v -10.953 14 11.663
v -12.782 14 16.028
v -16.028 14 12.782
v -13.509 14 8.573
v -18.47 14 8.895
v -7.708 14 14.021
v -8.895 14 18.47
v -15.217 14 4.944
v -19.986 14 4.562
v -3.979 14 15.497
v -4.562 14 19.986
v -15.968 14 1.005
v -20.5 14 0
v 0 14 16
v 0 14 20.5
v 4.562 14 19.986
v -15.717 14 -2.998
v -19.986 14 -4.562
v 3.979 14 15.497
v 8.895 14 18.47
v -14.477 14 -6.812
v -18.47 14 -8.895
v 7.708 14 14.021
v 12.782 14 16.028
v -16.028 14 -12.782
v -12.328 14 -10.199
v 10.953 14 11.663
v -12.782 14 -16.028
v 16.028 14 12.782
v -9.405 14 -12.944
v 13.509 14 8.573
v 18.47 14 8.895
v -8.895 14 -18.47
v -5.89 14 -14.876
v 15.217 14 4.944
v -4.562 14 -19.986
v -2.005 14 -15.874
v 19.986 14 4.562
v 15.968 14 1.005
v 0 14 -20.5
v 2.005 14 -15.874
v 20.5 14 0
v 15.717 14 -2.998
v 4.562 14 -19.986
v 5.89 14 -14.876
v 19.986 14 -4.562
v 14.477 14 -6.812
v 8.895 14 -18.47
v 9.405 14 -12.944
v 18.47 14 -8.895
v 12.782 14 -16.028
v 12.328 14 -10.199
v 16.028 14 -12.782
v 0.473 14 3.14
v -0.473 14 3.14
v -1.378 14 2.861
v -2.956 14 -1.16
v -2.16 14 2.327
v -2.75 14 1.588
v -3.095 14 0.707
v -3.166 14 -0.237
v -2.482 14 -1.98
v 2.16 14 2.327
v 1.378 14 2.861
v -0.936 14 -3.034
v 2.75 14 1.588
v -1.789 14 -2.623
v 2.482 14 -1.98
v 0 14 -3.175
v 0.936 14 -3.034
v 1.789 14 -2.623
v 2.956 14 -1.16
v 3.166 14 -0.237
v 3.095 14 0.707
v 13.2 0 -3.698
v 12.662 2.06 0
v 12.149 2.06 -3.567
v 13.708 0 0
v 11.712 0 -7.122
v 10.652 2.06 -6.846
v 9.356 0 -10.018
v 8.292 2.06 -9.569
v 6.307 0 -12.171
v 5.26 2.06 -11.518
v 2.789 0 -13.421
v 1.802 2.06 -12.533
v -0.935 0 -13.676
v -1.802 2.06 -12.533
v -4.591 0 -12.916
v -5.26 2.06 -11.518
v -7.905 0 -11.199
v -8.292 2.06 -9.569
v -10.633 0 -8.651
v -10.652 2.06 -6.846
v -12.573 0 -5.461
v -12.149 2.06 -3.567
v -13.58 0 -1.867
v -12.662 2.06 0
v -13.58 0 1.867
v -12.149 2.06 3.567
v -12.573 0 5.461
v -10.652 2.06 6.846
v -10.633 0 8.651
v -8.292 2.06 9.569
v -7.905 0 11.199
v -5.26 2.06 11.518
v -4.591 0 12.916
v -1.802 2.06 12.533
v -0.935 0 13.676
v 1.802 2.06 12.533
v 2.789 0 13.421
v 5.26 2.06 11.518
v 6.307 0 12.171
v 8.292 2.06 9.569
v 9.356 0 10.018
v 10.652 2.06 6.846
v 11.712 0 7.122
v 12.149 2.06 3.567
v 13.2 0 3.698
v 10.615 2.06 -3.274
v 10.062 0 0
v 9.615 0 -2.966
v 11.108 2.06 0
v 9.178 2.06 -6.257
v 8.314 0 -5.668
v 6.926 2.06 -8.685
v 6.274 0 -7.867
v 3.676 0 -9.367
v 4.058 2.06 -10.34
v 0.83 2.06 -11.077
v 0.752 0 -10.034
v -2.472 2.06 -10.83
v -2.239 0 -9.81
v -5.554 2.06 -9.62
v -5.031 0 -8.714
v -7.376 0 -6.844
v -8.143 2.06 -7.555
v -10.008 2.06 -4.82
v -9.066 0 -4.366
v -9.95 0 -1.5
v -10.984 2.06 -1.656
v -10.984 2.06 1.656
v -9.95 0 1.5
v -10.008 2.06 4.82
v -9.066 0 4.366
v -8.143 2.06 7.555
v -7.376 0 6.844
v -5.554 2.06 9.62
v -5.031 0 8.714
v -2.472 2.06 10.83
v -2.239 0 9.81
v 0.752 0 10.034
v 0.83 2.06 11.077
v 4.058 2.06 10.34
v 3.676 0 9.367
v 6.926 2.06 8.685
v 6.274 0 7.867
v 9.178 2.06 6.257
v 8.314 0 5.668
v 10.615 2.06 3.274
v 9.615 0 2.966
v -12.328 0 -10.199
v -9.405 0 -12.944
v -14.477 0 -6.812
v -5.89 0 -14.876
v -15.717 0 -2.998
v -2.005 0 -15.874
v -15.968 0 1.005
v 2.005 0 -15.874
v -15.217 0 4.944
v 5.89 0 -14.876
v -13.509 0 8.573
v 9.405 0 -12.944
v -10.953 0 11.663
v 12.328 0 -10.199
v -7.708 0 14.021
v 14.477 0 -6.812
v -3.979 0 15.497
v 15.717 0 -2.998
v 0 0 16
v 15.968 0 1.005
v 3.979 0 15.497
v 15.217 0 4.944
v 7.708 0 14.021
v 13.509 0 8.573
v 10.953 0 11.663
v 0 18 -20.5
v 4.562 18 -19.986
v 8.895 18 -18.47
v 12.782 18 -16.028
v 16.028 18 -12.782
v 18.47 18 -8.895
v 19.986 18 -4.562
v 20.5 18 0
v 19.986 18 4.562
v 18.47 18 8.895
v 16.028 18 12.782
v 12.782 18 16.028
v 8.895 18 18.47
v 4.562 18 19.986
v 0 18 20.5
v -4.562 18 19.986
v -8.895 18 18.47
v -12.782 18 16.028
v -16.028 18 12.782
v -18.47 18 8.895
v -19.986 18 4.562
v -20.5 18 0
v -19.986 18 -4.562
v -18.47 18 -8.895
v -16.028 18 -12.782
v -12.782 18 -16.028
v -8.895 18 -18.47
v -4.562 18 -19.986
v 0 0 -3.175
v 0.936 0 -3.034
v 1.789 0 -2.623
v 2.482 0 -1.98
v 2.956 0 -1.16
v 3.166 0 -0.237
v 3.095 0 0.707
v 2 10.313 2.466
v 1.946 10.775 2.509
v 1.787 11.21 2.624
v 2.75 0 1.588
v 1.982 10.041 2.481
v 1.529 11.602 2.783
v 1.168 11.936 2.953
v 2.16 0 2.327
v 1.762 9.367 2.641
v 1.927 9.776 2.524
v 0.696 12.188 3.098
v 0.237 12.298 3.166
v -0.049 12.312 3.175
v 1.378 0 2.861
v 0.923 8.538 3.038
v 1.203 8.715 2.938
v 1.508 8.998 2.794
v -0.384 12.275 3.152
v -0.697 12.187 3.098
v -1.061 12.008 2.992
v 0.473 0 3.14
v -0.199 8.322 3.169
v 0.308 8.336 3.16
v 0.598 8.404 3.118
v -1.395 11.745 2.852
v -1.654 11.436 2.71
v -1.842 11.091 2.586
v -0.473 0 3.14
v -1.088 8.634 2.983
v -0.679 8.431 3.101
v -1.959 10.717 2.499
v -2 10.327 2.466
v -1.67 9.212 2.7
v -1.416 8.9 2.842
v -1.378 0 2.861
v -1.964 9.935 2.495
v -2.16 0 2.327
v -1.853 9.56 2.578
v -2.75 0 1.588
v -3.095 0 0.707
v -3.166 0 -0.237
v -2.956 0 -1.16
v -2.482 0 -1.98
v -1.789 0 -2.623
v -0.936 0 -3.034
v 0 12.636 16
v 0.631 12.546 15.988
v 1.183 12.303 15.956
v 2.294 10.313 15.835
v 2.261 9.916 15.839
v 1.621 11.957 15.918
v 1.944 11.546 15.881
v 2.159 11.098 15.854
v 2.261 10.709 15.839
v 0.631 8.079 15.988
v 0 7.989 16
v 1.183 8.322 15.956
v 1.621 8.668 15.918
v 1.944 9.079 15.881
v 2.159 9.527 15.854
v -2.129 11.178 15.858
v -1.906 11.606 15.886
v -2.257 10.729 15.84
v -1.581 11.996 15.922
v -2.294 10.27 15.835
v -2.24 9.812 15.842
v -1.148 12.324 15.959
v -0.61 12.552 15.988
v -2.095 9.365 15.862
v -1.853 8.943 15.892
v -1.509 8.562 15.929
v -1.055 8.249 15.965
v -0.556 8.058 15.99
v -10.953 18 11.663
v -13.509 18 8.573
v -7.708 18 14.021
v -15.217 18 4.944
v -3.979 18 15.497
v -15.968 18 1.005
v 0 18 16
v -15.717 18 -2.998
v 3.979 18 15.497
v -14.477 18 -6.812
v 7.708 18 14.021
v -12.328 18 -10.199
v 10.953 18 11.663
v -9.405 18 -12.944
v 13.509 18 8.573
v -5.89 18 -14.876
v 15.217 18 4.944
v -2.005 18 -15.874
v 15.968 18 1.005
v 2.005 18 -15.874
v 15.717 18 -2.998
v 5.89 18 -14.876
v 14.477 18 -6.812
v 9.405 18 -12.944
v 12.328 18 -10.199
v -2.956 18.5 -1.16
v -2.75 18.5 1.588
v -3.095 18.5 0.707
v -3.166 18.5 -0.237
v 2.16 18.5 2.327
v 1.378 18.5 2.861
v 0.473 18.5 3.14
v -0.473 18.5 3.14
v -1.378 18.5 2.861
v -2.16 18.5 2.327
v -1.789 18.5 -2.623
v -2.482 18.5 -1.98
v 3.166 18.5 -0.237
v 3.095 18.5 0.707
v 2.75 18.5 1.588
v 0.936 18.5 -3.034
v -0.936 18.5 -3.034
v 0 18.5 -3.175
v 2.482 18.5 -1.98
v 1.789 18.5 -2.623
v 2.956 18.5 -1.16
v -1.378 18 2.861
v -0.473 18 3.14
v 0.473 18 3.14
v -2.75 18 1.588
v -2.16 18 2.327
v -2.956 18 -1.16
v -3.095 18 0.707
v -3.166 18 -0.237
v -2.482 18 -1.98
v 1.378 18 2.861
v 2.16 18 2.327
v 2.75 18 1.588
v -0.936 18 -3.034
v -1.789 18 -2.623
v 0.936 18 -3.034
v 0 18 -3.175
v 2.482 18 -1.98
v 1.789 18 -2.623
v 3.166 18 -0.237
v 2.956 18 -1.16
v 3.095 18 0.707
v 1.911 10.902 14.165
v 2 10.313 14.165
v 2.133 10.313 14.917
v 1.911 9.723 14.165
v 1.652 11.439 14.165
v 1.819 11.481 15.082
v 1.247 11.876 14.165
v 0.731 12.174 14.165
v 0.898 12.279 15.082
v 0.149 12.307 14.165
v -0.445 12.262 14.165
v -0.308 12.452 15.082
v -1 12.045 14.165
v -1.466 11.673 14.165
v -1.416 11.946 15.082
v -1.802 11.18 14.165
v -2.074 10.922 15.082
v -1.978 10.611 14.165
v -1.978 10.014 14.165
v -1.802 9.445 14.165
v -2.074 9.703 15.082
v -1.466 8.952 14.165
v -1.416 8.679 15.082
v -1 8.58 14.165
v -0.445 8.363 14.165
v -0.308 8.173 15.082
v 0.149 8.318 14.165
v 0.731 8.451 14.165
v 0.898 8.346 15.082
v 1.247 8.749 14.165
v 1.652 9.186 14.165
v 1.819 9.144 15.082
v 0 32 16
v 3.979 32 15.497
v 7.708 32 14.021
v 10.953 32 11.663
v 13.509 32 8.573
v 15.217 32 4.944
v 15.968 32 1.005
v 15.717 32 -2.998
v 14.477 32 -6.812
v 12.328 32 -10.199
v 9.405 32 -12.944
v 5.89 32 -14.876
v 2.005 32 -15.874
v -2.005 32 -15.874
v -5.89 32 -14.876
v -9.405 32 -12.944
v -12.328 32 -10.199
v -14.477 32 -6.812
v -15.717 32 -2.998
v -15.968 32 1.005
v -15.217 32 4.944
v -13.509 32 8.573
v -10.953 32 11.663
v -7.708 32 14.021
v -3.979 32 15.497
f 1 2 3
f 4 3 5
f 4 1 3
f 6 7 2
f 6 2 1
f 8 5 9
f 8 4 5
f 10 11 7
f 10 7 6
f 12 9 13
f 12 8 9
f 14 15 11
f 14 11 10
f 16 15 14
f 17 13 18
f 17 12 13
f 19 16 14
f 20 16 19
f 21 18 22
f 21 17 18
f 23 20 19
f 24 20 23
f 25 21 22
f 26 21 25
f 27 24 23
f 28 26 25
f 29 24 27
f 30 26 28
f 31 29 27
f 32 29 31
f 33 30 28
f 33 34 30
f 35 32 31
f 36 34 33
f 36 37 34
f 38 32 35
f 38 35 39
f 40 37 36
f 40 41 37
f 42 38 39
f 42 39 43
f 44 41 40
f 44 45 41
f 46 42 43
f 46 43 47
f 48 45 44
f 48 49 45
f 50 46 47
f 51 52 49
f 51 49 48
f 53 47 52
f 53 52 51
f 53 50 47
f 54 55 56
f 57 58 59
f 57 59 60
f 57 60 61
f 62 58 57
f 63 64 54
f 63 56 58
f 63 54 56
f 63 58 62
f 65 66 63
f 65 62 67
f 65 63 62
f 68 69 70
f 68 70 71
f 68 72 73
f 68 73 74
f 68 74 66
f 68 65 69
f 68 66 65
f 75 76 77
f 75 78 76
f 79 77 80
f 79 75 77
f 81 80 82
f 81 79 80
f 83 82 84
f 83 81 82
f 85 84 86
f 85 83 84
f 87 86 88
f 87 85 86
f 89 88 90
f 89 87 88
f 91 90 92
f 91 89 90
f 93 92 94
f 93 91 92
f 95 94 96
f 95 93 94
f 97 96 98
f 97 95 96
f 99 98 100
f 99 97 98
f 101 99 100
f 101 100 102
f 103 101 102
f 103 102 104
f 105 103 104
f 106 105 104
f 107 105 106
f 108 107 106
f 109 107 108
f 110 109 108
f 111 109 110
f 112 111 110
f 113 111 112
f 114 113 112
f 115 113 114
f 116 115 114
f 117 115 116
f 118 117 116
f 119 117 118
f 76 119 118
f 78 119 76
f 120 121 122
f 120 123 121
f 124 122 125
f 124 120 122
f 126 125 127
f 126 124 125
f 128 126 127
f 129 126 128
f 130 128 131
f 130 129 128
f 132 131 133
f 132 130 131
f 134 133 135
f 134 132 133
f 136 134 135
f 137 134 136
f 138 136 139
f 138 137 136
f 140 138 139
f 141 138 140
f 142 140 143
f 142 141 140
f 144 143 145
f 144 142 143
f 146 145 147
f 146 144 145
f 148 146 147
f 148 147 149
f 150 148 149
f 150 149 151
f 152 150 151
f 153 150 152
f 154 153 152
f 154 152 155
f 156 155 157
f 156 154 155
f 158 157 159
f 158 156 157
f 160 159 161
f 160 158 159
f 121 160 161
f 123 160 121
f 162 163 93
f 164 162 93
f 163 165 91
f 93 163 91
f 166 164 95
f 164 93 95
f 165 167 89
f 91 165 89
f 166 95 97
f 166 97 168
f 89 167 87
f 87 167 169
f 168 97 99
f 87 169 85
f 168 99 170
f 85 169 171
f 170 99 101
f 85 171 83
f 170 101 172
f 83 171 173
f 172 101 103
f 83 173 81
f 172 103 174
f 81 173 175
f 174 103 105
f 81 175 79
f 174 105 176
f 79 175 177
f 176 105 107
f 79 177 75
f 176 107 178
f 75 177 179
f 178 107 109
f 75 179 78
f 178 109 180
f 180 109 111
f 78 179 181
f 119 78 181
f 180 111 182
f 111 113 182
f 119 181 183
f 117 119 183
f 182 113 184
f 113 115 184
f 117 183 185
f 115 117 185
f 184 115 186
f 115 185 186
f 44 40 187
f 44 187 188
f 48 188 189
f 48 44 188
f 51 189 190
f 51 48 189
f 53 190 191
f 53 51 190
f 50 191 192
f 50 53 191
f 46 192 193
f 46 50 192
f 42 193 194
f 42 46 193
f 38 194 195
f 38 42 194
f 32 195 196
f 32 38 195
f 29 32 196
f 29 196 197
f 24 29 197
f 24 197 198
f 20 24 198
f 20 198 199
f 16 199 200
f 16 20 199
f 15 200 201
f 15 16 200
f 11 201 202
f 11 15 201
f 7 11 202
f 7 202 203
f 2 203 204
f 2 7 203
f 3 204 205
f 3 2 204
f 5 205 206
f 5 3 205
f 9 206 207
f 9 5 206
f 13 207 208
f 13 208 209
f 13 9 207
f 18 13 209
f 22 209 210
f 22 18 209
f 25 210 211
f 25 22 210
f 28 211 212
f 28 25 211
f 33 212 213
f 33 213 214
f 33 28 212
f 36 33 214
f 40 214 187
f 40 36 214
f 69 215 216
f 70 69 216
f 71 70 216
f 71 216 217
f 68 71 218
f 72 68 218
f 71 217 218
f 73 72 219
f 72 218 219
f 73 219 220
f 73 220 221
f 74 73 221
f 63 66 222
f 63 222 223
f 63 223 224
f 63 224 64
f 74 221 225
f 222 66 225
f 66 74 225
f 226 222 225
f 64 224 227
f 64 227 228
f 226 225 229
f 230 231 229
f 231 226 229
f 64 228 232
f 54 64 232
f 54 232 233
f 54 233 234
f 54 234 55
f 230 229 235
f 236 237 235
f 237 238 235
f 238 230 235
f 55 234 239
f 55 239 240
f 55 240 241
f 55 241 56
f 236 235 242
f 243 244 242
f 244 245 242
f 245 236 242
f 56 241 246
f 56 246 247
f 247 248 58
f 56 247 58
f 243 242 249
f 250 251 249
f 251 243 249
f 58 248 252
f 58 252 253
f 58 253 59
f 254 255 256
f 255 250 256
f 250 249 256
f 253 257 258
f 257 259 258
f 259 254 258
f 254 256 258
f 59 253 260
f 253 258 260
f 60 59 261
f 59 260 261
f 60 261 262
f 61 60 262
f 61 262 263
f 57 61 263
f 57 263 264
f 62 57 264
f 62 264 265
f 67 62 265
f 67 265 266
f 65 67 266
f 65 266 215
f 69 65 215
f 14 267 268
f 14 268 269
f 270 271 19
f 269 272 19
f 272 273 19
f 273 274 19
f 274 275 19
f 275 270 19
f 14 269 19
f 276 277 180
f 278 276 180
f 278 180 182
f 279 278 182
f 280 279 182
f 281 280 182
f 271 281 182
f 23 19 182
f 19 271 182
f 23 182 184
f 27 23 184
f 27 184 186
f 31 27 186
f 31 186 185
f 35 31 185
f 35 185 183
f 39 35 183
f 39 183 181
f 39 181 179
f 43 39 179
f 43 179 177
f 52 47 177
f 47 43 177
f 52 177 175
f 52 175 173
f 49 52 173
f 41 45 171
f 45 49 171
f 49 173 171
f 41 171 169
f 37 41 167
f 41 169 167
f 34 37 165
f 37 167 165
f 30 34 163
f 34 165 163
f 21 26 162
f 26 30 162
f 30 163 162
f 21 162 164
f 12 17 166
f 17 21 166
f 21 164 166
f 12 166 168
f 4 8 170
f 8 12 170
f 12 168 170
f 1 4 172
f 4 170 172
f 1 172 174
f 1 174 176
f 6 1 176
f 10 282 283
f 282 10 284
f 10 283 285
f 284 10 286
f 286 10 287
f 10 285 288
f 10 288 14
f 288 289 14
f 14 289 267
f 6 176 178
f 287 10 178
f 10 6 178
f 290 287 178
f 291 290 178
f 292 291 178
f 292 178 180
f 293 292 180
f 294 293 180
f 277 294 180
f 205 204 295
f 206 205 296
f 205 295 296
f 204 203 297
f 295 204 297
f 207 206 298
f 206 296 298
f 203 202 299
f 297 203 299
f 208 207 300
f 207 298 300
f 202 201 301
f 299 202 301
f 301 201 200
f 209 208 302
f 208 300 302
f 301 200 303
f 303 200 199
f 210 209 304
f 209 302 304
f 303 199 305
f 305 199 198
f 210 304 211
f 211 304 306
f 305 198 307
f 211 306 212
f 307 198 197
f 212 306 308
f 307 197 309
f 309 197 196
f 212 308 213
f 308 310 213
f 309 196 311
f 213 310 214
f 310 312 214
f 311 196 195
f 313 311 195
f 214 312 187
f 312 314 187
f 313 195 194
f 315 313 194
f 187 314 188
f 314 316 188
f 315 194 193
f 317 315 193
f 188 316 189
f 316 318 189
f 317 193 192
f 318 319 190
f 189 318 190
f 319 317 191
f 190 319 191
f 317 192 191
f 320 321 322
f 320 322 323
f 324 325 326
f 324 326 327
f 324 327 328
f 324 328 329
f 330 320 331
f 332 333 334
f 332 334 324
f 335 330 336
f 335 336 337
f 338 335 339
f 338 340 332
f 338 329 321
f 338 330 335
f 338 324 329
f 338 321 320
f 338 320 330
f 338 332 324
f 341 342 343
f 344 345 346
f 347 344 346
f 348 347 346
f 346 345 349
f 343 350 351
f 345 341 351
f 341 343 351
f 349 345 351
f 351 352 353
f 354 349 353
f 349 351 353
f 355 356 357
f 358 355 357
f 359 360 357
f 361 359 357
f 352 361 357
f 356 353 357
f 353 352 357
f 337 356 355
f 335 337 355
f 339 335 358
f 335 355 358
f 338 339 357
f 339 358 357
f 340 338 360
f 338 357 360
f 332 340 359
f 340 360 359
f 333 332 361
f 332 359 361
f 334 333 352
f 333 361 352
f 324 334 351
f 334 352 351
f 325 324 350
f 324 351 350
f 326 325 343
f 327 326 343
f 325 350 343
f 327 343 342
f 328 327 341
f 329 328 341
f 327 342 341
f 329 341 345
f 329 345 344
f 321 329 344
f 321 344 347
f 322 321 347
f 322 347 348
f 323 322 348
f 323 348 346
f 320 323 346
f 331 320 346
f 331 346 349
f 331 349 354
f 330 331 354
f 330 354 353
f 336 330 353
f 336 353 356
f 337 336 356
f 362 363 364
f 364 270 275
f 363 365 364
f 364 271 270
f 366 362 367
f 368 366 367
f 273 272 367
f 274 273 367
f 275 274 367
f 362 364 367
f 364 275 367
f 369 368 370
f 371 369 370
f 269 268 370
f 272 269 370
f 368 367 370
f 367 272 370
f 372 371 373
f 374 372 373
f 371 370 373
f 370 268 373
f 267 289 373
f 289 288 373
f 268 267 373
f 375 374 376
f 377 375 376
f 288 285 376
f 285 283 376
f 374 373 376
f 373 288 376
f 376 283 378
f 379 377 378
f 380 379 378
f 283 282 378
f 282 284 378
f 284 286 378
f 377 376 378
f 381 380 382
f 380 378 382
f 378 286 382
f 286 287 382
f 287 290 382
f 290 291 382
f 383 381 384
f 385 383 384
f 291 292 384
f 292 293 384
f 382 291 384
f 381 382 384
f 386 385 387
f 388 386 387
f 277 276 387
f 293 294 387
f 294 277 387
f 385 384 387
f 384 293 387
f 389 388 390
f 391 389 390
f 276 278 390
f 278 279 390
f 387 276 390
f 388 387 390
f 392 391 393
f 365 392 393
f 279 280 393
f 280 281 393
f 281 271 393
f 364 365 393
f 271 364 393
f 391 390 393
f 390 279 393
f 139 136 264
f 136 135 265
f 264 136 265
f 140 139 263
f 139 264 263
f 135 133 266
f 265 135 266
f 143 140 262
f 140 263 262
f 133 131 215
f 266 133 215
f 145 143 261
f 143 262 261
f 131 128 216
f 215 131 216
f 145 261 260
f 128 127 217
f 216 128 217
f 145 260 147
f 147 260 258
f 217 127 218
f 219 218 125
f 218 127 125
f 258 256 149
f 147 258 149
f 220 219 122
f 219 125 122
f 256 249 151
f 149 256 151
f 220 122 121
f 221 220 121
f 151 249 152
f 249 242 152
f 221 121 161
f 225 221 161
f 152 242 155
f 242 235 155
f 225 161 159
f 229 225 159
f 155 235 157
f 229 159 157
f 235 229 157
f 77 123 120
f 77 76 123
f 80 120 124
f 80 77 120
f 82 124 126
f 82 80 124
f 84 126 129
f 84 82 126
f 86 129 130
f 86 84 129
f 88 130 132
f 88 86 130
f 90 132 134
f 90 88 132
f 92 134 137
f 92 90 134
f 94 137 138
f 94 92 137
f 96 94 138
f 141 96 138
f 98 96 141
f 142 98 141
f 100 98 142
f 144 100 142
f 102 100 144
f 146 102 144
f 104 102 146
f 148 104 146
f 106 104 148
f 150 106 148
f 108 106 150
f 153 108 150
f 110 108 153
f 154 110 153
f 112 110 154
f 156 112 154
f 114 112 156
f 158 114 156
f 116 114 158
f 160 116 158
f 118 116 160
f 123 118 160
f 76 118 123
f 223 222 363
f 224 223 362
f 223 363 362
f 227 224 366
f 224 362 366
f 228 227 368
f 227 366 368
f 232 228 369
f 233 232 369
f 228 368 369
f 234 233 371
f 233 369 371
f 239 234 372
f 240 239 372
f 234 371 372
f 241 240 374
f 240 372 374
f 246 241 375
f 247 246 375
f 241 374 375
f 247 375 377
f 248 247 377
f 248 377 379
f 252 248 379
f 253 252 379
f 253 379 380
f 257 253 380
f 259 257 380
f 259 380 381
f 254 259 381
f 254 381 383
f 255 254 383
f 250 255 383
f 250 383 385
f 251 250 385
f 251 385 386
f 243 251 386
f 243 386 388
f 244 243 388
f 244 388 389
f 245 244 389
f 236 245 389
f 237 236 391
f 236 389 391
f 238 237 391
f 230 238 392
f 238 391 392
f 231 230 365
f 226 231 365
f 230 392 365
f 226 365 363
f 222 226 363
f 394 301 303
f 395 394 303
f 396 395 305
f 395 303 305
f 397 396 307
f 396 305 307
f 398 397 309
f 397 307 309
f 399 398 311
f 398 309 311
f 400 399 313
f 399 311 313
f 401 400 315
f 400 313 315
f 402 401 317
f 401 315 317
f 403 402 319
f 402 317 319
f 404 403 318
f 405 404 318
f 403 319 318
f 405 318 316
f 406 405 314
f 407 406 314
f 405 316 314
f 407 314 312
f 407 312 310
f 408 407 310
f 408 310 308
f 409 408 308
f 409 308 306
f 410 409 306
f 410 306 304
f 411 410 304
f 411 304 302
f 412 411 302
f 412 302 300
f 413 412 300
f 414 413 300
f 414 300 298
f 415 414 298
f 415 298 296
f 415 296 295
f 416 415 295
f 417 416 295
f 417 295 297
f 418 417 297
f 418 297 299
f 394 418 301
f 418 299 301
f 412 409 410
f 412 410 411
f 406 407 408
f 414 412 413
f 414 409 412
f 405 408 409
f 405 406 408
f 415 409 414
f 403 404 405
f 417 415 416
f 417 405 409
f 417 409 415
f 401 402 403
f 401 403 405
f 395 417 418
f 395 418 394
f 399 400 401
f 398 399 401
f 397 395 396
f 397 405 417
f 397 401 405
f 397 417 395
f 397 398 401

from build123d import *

# Parameters (mm, degrees)
SKETCH1_R          = 16
EXTRUDE1_DEPTH     = 32
SKETCH2_R          = 3.175
EXTRUDE2_DEPTH     = 18.5
SKETCH5_R          = 20.5
EXTRUDE3_DEPTH     = 4
CUT_EXTRUDE1_START = 20
SKETCH6_R          = 2
CUT_EXTRUDE1_DEPTH = 20
CUT_EXTRUDE3_START = 19
SKETCH7_R          = 2.852570135
CUT_EXTRUDE3_DEPTH = 5
CUT_EXTRUDE3_DRAFT = -10


with BuildPart() as part:
    # Sketch1 → Extrude1 (new body)
    with BuildSketch(Plane(origin=(0, 0, 0), x_dir=(1, 0, 0), z_dir=(0, 1, 0))):
        with Locations(Location((0, 0, 0), (0, 0, 270))):
            Circle(SKETCH1_R)
    extrude(amount=EXTRUDE1_DEPTH)

    # Sketch2 → Extrude2 (cut)
    with BuildSketch(Plane.XZ):
        with Locations(Location((0, 0, 0), (0, 0, 270))):
            Circle(SKETCH2_R)
    extrude(amount=-EXTRUDE2_DEPTH, mode=Mode.SUBTRACT)

    # Cut-Sweep1: sweep along a path in Sketch4
    with BuildLine(Plane(origin=(0, 0, 0), x_dir=(1, 0, 0), z_dir=(0, 1, 0))) as cut_sweep1_path:
        CenterArc((0, 0), 11.89136951, 0, 360)
    # Sketch3 → Cut-Sweep1 (sweep, cut)
    with BuildSketch(Plane.XY):
        Polygon((-13.707912963, 0), (-12.662211751, 2.059945265), (-11.108011678, 2.059945265), (-10.062310466, 0), align=None)
    sweep(path=cut_sweep1_path.line, mode=Mode.SUBTRACT)

    # Sketch5 → Extrude3 (add)
    with BuildSketch(Plane.XZ.offset(-14)):
        with Locations(Location((0, 0, 0), (0, 0, 270))):
            Circle(SKETCH5_R)
    extrude(amount=-EXTRUDE3_DEPTH)

    # Sketch6 → Cut-Extrude1 (cut)
    with BuildSketch(Plane.XY.offset(CUT_EXTRUDE1_START)):
        with Locations((0, 10.312515401)):
            Circle(SKETCH6_R)
    extrude(amount=-CUT_EXTRUDE1_DEPTH, mode=Mode.SUBTRACT)


with BuildPart() as cut_extrude3_tool:
    # Sketch7 → Cut-Extrude3 (with draft: the straight prism first)
    with BuildSketch(Plane.XY.offset(CUT_EXTRUDE3_START)):
        with Locations((0, 10.312515401)):
            Circle(SKETCH7_R)
    extrude(amount=-CUT_EXTRUDE3_DEPTH)
    # Cut-Extrude3: the draft: its side faces are tilted about the plane it starts from
    cut_extrude3_sides = [cut_extrude3_tool.faces().sort_by_distance(p)[0] for p in [
        (-2.852570135, 10.312515401, 16.5),
    ]]
    draft(cut_extrude3_sides, Plane.XY.offset(CUT_EXTRUDE3_START), CUT_EXTRUDE3_DRAFT)


with BuildPart() as part_1:
    add(part.part)

    # Cut-Extrude3: cut by cut_extrude3_tool
    add(cut_extrude3_tool.part, mode=Mode.SUBTRACT)


solid = part_1.part
